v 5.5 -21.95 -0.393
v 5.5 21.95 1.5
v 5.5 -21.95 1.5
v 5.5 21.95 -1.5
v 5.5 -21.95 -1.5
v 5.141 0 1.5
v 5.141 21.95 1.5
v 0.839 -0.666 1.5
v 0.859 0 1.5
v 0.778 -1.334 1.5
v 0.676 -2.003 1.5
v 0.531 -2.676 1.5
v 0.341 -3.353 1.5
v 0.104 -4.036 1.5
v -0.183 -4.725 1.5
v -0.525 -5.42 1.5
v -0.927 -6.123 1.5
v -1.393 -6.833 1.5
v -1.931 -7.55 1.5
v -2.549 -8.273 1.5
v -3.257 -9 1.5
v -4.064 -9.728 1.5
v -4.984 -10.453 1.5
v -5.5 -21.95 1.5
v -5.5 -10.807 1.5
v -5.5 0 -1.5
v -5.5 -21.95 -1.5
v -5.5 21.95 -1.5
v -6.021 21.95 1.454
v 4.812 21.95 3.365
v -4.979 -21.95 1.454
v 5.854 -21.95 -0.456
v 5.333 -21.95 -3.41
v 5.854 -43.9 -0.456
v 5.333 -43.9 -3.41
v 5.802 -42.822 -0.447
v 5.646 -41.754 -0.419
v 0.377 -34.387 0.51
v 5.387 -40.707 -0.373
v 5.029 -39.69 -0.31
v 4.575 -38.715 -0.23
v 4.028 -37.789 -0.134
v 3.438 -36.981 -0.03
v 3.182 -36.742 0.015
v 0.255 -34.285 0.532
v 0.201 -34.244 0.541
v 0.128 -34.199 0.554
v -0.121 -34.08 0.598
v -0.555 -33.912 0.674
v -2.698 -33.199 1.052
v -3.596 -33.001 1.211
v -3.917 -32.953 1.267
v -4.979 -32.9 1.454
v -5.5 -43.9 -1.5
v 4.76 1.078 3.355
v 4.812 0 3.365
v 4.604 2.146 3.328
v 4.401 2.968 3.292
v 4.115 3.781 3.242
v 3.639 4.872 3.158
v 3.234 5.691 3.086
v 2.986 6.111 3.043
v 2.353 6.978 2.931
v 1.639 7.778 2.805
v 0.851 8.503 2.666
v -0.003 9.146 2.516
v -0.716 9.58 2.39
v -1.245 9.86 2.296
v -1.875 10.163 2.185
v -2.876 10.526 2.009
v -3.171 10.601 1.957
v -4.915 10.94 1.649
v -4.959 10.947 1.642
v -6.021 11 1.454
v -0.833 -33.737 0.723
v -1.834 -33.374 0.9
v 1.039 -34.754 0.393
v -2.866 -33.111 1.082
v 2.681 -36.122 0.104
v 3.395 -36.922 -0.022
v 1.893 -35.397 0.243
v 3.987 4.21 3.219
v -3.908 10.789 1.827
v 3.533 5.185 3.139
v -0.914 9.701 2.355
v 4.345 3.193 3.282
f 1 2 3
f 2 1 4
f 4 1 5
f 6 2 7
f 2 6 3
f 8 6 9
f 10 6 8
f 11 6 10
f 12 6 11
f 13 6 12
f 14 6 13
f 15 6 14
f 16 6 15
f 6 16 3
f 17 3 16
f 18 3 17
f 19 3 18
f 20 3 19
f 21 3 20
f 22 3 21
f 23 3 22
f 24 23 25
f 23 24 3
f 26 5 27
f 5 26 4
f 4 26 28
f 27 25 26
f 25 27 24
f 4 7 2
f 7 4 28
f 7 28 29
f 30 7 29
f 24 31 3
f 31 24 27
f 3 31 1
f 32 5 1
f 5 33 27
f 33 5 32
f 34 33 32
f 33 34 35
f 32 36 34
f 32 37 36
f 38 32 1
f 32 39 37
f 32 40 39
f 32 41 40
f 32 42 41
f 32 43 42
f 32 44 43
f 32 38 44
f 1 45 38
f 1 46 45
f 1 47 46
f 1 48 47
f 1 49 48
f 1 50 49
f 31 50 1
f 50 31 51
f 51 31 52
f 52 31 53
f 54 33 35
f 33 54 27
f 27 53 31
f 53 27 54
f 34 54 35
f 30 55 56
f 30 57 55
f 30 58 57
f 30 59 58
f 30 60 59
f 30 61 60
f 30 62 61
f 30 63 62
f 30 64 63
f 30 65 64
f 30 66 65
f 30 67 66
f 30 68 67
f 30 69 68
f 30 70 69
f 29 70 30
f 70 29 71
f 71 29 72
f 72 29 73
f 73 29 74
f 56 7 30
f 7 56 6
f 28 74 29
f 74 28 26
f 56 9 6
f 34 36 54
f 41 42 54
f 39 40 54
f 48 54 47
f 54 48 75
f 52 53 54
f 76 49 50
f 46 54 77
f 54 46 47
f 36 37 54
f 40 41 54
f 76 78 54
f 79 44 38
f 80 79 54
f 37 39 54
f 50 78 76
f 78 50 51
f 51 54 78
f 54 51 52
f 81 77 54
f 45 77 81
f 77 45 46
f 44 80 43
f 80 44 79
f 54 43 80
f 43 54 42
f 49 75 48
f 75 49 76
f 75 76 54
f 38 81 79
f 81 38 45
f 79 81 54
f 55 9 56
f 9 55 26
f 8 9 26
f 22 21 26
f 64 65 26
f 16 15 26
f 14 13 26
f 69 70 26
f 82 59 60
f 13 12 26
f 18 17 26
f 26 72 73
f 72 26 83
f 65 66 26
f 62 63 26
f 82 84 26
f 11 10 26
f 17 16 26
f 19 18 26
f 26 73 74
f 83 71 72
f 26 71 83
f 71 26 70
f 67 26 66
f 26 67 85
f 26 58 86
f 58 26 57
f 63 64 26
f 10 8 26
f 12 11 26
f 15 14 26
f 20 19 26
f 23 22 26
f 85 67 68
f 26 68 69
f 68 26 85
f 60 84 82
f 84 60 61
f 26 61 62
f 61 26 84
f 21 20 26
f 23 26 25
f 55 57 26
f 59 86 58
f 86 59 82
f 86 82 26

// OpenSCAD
module bracket() {
    difference() {
        union() {
            // Central rectangular pad
            translate([-5.5, -21.95, -1.5])
                cube([11.0, 43.9, 3.0]);

            // Left arm
            translate([-5.5, -21.95, -1.5])
                rotate([0, 10, 0])
                translate([0, -21.95, 0])
                cube([11.0, 21.95, 3.0]);

            // Right arm
            translate([-5.5, 0, -1.5])
                rotate([0, -10, 0])
                translate([0, 0, 0])
                cube([11.0, 21.95, 3.0]);
        }

        // Fillet transitions
        translate([-5.5, -21.95, -1.5])
            rotate([0, 10, 0])
            translate([0, -21.95, 0])
            cylinder(h=3.0, r1=0, r2=11.0, $fn=64);

        translate([-5.5, 0, -1.5])
            rotate([0, -10, 0])
            translate([0, 0, 0])
            cylinder(h=3.0, r1=0, r2=11.0, $fn=64);
    }
}

bracket();
